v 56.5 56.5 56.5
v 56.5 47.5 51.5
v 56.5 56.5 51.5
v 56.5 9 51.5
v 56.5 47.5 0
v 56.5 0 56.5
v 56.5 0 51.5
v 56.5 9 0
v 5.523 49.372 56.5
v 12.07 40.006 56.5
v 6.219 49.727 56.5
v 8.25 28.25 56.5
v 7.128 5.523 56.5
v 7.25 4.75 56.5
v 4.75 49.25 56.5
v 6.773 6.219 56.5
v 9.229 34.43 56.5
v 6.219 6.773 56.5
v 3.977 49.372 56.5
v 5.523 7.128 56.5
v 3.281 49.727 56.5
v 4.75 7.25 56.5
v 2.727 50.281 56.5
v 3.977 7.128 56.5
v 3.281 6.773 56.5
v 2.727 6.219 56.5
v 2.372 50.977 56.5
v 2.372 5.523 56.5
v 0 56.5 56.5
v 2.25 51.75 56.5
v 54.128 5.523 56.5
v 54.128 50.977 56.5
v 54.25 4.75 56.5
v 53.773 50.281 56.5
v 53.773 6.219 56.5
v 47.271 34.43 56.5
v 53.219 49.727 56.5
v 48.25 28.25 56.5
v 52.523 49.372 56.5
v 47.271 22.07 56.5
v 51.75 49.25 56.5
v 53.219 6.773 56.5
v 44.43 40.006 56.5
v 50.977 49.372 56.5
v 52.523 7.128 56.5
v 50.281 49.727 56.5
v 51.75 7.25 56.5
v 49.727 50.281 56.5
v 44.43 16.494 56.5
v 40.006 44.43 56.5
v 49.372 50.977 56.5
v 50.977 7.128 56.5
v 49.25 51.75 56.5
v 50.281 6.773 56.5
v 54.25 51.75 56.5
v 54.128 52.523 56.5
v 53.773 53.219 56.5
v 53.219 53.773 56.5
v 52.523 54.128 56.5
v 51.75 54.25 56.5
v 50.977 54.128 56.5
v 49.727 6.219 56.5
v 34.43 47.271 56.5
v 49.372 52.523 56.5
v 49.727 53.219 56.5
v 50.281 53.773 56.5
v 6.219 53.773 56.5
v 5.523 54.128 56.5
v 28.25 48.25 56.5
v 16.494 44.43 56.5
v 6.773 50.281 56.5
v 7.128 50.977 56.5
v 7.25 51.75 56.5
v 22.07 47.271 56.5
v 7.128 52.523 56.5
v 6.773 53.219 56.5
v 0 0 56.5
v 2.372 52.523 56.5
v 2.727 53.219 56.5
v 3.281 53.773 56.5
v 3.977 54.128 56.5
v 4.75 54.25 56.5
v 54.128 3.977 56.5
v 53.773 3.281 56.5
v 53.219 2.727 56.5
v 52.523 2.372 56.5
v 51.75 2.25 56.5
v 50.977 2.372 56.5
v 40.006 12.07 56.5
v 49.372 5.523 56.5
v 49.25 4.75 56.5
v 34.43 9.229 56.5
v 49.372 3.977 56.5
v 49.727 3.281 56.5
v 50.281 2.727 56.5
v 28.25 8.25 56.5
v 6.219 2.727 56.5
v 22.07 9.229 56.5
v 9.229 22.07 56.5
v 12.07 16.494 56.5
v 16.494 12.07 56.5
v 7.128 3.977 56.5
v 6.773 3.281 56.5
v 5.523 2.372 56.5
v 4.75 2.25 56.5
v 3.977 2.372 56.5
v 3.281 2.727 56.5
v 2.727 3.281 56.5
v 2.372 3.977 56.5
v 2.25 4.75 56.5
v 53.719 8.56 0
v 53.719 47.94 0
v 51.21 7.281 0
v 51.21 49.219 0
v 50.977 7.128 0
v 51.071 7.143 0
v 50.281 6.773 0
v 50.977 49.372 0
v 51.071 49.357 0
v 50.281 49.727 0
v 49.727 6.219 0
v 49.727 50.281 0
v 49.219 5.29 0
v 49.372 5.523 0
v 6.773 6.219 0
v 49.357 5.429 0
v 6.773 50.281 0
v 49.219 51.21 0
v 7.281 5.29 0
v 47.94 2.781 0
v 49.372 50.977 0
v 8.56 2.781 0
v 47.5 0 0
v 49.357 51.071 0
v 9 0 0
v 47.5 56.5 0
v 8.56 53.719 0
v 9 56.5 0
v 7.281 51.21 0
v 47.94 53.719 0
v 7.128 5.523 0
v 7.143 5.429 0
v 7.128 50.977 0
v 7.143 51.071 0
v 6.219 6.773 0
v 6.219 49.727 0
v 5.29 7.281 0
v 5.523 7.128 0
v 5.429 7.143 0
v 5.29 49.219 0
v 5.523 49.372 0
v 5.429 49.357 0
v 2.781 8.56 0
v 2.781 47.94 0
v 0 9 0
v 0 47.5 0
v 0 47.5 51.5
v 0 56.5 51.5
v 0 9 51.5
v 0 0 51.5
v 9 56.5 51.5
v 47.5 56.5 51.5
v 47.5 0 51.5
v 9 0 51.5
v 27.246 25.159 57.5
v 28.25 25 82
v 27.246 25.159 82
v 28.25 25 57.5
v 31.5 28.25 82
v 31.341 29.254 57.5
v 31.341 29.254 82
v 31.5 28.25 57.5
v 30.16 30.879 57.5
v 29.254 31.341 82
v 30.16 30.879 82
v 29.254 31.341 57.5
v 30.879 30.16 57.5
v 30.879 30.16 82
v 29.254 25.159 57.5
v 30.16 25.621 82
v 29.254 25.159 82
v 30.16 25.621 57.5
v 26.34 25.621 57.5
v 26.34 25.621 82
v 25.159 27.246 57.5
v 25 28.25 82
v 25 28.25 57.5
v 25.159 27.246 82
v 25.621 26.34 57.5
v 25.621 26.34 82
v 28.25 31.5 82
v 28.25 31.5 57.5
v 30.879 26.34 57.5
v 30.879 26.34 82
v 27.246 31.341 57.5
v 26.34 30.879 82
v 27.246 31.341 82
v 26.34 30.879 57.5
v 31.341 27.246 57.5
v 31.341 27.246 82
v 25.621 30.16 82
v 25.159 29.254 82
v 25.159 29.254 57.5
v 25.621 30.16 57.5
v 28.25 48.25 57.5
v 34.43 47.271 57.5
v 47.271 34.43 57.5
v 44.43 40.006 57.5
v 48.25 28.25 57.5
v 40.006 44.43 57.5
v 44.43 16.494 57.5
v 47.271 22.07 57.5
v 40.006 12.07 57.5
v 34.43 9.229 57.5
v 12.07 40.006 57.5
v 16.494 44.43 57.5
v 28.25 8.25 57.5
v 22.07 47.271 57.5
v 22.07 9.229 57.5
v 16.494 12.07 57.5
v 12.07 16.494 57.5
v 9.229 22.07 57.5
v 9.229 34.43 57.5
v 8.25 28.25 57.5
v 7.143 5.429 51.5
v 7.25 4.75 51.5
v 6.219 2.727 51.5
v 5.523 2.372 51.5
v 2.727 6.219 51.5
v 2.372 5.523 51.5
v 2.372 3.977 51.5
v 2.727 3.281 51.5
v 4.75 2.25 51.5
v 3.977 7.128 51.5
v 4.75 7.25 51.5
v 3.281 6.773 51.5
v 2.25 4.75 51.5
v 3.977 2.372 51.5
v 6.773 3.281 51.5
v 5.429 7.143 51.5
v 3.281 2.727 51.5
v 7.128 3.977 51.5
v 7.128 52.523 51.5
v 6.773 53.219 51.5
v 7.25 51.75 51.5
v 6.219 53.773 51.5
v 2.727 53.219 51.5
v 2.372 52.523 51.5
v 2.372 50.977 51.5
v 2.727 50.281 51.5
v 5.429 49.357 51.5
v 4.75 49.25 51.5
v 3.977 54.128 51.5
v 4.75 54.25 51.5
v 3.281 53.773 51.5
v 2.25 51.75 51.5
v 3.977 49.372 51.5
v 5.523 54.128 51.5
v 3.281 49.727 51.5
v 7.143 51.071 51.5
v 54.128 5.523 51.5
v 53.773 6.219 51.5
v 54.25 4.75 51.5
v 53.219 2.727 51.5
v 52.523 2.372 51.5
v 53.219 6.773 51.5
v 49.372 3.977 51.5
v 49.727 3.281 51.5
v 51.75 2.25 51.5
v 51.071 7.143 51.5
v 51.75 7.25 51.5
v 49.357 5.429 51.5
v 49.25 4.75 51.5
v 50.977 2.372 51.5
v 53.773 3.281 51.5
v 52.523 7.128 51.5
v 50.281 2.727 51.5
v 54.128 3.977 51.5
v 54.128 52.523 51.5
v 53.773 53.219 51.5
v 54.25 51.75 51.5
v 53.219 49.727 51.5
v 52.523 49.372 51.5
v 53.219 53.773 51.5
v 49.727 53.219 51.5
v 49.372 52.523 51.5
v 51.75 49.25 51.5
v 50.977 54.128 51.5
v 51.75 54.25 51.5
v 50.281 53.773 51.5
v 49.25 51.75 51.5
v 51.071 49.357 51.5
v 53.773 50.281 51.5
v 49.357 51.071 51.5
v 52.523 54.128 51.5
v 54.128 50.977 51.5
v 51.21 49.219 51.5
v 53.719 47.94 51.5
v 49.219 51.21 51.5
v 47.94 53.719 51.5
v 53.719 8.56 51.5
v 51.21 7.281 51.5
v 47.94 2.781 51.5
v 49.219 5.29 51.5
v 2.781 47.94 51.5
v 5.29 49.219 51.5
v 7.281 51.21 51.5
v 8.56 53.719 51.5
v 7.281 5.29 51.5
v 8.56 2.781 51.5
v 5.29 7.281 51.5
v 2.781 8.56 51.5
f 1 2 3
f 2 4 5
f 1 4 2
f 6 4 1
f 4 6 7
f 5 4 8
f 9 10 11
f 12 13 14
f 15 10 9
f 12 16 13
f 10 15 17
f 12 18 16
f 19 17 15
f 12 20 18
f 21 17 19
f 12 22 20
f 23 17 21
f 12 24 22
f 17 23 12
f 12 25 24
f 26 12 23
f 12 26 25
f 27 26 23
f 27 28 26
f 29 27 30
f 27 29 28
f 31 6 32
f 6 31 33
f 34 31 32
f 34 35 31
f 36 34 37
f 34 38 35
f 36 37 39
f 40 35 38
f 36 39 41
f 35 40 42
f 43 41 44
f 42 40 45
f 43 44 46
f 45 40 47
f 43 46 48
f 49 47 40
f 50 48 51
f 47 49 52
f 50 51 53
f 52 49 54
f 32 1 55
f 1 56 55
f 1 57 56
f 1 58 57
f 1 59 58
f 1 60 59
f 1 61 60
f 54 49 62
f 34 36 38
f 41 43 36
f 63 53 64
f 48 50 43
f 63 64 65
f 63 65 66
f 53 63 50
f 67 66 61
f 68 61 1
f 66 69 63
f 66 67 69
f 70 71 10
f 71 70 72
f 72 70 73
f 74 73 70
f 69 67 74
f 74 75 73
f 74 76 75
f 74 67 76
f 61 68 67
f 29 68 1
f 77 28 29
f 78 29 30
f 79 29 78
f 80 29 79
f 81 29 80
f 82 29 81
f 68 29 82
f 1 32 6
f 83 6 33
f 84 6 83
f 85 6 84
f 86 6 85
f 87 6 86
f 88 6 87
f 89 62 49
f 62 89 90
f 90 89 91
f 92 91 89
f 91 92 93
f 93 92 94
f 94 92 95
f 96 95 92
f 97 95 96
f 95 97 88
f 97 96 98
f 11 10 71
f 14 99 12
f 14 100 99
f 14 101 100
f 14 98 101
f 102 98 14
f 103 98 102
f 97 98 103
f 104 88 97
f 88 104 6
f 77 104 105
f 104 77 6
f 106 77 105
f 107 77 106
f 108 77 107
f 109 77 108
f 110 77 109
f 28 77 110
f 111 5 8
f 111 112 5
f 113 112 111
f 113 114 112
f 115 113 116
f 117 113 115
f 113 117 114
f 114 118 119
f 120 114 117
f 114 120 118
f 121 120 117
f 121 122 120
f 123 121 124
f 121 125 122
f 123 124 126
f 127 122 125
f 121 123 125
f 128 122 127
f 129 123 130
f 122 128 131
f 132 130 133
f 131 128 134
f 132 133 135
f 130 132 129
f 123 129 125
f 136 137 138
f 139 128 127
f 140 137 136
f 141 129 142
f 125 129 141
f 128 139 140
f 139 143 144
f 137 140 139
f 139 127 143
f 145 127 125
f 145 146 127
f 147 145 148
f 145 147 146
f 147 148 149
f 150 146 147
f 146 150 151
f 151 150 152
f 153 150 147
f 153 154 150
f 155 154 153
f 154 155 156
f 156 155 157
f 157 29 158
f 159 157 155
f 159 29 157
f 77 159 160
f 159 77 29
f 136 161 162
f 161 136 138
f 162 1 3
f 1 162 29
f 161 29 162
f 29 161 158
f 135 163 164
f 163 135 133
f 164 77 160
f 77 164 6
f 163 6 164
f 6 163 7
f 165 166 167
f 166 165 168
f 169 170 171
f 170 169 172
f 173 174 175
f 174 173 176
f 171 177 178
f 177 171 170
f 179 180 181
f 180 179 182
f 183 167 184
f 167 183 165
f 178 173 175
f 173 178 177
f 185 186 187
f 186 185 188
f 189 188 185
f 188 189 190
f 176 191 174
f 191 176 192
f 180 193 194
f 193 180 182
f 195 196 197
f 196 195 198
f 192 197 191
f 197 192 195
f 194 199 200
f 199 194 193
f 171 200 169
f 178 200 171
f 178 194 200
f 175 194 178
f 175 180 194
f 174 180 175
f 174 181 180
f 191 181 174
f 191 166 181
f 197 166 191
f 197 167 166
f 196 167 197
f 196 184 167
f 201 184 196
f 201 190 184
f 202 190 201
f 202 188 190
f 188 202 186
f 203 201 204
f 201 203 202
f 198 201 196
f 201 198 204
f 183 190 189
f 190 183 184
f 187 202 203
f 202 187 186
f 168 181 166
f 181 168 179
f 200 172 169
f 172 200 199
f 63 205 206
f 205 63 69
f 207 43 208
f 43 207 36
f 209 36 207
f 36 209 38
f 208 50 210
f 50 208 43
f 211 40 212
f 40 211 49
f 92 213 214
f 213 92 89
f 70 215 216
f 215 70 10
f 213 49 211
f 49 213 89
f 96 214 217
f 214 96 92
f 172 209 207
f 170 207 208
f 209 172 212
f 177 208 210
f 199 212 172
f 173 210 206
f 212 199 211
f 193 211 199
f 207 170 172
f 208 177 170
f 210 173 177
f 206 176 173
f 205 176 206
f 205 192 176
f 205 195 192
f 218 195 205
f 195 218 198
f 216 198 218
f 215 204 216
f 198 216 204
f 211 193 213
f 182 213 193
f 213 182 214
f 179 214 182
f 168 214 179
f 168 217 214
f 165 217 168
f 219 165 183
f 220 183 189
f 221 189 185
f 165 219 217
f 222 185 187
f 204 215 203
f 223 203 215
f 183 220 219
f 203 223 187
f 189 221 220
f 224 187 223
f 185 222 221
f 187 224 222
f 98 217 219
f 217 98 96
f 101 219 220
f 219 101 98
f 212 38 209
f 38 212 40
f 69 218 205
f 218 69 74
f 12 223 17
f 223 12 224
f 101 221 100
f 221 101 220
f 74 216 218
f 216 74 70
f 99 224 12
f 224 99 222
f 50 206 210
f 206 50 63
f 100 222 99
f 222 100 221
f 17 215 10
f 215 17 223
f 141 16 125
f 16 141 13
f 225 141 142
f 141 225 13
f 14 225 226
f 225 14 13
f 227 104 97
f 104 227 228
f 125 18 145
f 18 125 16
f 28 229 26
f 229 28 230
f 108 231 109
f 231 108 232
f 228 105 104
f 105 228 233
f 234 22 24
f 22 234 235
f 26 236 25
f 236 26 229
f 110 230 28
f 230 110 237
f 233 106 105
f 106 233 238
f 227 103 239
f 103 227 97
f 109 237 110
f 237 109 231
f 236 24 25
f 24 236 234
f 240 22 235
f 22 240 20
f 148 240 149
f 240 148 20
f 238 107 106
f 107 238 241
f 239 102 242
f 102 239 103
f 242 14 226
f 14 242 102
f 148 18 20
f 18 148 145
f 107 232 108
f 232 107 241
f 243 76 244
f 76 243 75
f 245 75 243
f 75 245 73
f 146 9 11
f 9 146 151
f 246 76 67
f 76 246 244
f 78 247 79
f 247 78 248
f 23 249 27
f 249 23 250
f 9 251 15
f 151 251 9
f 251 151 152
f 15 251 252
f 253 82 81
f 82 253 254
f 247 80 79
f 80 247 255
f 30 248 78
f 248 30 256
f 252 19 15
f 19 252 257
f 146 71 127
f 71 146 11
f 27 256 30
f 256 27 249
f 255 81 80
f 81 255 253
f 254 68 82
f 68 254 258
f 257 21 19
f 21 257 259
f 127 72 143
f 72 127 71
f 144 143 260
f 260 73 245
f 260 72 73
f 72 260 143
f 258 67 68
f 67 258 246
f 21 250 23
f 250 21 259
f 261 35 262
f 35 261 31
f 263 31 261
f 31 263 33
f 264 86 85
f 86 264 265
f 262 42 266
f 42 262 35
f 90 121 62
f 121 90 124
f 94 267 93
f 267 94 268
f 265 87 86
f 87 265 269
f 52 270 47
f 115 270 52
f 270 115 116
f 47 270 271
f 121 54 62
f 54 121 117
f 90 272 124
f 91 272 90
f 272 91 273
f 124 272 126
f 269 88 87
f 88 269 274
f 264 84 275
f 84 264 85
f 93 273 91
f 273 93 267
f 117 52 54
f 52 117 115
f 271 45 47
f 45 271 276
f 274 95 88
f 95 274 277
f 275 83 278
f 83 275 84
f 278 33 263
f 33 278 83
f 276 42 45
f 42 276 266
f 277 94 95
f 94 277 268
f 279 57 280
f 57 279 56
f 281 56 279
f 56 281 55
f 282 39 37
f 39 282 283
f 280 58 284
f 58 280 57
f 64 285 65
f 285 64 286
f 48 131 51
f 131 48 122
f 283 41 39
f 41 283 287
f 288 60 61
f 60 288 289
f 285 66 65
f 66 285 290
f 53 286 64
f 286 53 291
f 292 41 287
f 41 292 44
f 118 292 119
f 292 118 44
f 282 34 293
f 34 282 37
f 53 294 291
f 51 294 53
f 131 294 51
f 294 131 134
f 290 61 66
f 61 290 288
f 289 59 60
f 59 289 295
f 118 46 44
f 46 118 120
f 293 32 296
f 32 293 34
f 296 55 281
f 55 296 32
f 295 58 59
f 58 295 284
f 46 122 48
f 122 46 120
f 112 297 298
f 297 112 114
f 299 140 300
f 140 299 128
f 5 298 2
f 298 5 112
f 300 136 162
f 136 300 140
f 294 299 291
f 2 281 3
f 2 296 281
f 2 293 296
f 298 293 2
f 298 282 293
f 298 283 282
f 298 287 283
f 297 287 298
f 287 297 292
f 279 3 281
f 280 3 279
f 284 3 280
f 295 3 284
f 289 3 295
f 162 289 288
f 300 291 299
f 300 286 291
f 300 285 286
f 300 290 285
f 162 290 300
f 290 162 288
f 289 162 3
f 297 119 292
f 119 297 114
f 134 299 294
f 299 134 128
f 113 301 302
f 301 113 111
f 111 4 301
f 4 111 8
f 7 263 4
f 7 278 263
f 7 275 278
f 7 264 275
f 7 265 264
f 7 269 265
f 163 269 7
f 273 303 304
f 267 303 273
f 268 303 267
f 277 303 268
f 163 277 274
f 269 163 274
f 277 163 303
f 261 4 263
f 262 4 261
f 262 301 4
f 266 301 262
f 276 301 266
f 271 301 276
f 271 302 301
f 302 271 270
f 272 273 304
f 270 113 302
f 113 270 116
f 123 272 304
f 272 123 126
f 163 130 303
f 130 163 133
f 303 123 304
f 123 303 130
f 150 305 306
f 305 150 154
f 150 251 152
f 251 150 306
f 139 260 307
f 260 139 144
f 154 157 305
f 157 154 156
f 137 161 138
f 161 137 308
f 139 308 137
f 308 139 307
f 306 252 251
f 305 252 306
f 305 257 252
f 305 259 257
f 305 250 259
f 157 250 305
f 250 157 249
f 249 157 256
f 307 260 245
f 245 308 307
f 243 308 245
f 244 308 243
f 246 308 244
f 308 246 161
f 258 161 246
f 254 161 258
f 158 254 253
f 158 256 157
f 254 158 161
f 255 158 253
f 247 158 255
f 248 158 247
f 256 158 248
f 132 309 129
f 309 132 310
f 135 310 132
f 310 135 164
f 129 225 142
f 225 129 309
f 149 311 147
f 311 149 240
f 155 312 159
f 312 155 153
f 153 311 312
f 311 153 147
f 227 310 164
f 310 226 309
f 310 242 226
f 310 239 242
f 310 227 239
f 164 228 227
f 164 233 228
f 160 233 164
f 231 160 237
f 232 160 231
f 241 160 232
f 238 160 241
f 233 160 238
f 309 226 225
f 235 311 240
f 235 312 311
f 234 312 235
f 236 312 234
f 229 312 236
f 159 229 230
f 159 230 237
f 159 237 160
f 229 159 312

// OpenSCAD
difference(){
    
    breedte=56.5;
    lengte=breedte;
    diepte=56.5;
    afstandTussenGaten=47;
    halveBreedte=breedte/2;
    halveLengte=lengte/2;
    halveAfstandTussenGaten=afstandTussenGaten/2;
    
	union(){
        translate([0,0,0]){
           cube([breedte,lengte,56.5], center=false);
        }
        translate([halveBreedte,halveLengte,0]){
            rotate([0,0,0]){
                cylinder(h=diepte+25.5, r=6.5/2, $fn=20, center=false);
            }
        }
        translate([halveBreedte,halveLengte,0]){
            rotate([0,0,0]){
                cylinder(h=diepte+1, r=20, $fn=20, center=false);
            }
        }

 
	}
	union() {

        translate([halveBreedte-halveAfstandTussenGaten,halveLengte-halveAfstandTussenGaten,0]){
            rotate([0,0,0]){
                cylinder(h=diepte+1, r=2.5, $fn=20, center=false);
            }
        }
        translate([halveBreedte-halveAfstandTussenGaten,halveLengte+halveAfstandTussenGaten,0]){
            rotate([0,0,0]){
                cylinder(h=diepte+1, r=2.5, $fn=20, center=false);
            }
        }
        translate([halveBreedte+halveAfstandTussenGaten,halveLengte-halveAfstandTussenGaten,0]){
            rotate([0,0,0]){
                cylinder(h=diepte+1, r=2.5, $fn=20, center=false);
            }
        }
        translate([halveBreedte+halveAfstandTussenGaten,halveLengte+halveAfstandTussenGaten,0]){
            rotate([0,0,0]){
                cylinder(h=diepte+1, r=2.5, $fn=20, center=false);
            }
        }


        
        translate([breedte,lengte,-1]){
            rotate([0,0,0]){
                cylinder(h=diepte-4, r=9, $fn=20, center=false);
            }
        }
        translate([breedte,0,-1]){
            rotate([0,0,0]){
                cylinder(h=diepte-4, r=9, $fn=20, center=false);
            }
        }
        translate([0,lengte,-1]){
            rotate([0,0,0]){
                cylinder(h=diepte-4, r=9, $fn=20, center=false);
            }
        }
        translate([0,0,-1]){
            rotate([0,0,0]){
                cylinder(h=diepte-4, r=9, $fn=20, center=false);
            }
        }
        
        
	}
}
